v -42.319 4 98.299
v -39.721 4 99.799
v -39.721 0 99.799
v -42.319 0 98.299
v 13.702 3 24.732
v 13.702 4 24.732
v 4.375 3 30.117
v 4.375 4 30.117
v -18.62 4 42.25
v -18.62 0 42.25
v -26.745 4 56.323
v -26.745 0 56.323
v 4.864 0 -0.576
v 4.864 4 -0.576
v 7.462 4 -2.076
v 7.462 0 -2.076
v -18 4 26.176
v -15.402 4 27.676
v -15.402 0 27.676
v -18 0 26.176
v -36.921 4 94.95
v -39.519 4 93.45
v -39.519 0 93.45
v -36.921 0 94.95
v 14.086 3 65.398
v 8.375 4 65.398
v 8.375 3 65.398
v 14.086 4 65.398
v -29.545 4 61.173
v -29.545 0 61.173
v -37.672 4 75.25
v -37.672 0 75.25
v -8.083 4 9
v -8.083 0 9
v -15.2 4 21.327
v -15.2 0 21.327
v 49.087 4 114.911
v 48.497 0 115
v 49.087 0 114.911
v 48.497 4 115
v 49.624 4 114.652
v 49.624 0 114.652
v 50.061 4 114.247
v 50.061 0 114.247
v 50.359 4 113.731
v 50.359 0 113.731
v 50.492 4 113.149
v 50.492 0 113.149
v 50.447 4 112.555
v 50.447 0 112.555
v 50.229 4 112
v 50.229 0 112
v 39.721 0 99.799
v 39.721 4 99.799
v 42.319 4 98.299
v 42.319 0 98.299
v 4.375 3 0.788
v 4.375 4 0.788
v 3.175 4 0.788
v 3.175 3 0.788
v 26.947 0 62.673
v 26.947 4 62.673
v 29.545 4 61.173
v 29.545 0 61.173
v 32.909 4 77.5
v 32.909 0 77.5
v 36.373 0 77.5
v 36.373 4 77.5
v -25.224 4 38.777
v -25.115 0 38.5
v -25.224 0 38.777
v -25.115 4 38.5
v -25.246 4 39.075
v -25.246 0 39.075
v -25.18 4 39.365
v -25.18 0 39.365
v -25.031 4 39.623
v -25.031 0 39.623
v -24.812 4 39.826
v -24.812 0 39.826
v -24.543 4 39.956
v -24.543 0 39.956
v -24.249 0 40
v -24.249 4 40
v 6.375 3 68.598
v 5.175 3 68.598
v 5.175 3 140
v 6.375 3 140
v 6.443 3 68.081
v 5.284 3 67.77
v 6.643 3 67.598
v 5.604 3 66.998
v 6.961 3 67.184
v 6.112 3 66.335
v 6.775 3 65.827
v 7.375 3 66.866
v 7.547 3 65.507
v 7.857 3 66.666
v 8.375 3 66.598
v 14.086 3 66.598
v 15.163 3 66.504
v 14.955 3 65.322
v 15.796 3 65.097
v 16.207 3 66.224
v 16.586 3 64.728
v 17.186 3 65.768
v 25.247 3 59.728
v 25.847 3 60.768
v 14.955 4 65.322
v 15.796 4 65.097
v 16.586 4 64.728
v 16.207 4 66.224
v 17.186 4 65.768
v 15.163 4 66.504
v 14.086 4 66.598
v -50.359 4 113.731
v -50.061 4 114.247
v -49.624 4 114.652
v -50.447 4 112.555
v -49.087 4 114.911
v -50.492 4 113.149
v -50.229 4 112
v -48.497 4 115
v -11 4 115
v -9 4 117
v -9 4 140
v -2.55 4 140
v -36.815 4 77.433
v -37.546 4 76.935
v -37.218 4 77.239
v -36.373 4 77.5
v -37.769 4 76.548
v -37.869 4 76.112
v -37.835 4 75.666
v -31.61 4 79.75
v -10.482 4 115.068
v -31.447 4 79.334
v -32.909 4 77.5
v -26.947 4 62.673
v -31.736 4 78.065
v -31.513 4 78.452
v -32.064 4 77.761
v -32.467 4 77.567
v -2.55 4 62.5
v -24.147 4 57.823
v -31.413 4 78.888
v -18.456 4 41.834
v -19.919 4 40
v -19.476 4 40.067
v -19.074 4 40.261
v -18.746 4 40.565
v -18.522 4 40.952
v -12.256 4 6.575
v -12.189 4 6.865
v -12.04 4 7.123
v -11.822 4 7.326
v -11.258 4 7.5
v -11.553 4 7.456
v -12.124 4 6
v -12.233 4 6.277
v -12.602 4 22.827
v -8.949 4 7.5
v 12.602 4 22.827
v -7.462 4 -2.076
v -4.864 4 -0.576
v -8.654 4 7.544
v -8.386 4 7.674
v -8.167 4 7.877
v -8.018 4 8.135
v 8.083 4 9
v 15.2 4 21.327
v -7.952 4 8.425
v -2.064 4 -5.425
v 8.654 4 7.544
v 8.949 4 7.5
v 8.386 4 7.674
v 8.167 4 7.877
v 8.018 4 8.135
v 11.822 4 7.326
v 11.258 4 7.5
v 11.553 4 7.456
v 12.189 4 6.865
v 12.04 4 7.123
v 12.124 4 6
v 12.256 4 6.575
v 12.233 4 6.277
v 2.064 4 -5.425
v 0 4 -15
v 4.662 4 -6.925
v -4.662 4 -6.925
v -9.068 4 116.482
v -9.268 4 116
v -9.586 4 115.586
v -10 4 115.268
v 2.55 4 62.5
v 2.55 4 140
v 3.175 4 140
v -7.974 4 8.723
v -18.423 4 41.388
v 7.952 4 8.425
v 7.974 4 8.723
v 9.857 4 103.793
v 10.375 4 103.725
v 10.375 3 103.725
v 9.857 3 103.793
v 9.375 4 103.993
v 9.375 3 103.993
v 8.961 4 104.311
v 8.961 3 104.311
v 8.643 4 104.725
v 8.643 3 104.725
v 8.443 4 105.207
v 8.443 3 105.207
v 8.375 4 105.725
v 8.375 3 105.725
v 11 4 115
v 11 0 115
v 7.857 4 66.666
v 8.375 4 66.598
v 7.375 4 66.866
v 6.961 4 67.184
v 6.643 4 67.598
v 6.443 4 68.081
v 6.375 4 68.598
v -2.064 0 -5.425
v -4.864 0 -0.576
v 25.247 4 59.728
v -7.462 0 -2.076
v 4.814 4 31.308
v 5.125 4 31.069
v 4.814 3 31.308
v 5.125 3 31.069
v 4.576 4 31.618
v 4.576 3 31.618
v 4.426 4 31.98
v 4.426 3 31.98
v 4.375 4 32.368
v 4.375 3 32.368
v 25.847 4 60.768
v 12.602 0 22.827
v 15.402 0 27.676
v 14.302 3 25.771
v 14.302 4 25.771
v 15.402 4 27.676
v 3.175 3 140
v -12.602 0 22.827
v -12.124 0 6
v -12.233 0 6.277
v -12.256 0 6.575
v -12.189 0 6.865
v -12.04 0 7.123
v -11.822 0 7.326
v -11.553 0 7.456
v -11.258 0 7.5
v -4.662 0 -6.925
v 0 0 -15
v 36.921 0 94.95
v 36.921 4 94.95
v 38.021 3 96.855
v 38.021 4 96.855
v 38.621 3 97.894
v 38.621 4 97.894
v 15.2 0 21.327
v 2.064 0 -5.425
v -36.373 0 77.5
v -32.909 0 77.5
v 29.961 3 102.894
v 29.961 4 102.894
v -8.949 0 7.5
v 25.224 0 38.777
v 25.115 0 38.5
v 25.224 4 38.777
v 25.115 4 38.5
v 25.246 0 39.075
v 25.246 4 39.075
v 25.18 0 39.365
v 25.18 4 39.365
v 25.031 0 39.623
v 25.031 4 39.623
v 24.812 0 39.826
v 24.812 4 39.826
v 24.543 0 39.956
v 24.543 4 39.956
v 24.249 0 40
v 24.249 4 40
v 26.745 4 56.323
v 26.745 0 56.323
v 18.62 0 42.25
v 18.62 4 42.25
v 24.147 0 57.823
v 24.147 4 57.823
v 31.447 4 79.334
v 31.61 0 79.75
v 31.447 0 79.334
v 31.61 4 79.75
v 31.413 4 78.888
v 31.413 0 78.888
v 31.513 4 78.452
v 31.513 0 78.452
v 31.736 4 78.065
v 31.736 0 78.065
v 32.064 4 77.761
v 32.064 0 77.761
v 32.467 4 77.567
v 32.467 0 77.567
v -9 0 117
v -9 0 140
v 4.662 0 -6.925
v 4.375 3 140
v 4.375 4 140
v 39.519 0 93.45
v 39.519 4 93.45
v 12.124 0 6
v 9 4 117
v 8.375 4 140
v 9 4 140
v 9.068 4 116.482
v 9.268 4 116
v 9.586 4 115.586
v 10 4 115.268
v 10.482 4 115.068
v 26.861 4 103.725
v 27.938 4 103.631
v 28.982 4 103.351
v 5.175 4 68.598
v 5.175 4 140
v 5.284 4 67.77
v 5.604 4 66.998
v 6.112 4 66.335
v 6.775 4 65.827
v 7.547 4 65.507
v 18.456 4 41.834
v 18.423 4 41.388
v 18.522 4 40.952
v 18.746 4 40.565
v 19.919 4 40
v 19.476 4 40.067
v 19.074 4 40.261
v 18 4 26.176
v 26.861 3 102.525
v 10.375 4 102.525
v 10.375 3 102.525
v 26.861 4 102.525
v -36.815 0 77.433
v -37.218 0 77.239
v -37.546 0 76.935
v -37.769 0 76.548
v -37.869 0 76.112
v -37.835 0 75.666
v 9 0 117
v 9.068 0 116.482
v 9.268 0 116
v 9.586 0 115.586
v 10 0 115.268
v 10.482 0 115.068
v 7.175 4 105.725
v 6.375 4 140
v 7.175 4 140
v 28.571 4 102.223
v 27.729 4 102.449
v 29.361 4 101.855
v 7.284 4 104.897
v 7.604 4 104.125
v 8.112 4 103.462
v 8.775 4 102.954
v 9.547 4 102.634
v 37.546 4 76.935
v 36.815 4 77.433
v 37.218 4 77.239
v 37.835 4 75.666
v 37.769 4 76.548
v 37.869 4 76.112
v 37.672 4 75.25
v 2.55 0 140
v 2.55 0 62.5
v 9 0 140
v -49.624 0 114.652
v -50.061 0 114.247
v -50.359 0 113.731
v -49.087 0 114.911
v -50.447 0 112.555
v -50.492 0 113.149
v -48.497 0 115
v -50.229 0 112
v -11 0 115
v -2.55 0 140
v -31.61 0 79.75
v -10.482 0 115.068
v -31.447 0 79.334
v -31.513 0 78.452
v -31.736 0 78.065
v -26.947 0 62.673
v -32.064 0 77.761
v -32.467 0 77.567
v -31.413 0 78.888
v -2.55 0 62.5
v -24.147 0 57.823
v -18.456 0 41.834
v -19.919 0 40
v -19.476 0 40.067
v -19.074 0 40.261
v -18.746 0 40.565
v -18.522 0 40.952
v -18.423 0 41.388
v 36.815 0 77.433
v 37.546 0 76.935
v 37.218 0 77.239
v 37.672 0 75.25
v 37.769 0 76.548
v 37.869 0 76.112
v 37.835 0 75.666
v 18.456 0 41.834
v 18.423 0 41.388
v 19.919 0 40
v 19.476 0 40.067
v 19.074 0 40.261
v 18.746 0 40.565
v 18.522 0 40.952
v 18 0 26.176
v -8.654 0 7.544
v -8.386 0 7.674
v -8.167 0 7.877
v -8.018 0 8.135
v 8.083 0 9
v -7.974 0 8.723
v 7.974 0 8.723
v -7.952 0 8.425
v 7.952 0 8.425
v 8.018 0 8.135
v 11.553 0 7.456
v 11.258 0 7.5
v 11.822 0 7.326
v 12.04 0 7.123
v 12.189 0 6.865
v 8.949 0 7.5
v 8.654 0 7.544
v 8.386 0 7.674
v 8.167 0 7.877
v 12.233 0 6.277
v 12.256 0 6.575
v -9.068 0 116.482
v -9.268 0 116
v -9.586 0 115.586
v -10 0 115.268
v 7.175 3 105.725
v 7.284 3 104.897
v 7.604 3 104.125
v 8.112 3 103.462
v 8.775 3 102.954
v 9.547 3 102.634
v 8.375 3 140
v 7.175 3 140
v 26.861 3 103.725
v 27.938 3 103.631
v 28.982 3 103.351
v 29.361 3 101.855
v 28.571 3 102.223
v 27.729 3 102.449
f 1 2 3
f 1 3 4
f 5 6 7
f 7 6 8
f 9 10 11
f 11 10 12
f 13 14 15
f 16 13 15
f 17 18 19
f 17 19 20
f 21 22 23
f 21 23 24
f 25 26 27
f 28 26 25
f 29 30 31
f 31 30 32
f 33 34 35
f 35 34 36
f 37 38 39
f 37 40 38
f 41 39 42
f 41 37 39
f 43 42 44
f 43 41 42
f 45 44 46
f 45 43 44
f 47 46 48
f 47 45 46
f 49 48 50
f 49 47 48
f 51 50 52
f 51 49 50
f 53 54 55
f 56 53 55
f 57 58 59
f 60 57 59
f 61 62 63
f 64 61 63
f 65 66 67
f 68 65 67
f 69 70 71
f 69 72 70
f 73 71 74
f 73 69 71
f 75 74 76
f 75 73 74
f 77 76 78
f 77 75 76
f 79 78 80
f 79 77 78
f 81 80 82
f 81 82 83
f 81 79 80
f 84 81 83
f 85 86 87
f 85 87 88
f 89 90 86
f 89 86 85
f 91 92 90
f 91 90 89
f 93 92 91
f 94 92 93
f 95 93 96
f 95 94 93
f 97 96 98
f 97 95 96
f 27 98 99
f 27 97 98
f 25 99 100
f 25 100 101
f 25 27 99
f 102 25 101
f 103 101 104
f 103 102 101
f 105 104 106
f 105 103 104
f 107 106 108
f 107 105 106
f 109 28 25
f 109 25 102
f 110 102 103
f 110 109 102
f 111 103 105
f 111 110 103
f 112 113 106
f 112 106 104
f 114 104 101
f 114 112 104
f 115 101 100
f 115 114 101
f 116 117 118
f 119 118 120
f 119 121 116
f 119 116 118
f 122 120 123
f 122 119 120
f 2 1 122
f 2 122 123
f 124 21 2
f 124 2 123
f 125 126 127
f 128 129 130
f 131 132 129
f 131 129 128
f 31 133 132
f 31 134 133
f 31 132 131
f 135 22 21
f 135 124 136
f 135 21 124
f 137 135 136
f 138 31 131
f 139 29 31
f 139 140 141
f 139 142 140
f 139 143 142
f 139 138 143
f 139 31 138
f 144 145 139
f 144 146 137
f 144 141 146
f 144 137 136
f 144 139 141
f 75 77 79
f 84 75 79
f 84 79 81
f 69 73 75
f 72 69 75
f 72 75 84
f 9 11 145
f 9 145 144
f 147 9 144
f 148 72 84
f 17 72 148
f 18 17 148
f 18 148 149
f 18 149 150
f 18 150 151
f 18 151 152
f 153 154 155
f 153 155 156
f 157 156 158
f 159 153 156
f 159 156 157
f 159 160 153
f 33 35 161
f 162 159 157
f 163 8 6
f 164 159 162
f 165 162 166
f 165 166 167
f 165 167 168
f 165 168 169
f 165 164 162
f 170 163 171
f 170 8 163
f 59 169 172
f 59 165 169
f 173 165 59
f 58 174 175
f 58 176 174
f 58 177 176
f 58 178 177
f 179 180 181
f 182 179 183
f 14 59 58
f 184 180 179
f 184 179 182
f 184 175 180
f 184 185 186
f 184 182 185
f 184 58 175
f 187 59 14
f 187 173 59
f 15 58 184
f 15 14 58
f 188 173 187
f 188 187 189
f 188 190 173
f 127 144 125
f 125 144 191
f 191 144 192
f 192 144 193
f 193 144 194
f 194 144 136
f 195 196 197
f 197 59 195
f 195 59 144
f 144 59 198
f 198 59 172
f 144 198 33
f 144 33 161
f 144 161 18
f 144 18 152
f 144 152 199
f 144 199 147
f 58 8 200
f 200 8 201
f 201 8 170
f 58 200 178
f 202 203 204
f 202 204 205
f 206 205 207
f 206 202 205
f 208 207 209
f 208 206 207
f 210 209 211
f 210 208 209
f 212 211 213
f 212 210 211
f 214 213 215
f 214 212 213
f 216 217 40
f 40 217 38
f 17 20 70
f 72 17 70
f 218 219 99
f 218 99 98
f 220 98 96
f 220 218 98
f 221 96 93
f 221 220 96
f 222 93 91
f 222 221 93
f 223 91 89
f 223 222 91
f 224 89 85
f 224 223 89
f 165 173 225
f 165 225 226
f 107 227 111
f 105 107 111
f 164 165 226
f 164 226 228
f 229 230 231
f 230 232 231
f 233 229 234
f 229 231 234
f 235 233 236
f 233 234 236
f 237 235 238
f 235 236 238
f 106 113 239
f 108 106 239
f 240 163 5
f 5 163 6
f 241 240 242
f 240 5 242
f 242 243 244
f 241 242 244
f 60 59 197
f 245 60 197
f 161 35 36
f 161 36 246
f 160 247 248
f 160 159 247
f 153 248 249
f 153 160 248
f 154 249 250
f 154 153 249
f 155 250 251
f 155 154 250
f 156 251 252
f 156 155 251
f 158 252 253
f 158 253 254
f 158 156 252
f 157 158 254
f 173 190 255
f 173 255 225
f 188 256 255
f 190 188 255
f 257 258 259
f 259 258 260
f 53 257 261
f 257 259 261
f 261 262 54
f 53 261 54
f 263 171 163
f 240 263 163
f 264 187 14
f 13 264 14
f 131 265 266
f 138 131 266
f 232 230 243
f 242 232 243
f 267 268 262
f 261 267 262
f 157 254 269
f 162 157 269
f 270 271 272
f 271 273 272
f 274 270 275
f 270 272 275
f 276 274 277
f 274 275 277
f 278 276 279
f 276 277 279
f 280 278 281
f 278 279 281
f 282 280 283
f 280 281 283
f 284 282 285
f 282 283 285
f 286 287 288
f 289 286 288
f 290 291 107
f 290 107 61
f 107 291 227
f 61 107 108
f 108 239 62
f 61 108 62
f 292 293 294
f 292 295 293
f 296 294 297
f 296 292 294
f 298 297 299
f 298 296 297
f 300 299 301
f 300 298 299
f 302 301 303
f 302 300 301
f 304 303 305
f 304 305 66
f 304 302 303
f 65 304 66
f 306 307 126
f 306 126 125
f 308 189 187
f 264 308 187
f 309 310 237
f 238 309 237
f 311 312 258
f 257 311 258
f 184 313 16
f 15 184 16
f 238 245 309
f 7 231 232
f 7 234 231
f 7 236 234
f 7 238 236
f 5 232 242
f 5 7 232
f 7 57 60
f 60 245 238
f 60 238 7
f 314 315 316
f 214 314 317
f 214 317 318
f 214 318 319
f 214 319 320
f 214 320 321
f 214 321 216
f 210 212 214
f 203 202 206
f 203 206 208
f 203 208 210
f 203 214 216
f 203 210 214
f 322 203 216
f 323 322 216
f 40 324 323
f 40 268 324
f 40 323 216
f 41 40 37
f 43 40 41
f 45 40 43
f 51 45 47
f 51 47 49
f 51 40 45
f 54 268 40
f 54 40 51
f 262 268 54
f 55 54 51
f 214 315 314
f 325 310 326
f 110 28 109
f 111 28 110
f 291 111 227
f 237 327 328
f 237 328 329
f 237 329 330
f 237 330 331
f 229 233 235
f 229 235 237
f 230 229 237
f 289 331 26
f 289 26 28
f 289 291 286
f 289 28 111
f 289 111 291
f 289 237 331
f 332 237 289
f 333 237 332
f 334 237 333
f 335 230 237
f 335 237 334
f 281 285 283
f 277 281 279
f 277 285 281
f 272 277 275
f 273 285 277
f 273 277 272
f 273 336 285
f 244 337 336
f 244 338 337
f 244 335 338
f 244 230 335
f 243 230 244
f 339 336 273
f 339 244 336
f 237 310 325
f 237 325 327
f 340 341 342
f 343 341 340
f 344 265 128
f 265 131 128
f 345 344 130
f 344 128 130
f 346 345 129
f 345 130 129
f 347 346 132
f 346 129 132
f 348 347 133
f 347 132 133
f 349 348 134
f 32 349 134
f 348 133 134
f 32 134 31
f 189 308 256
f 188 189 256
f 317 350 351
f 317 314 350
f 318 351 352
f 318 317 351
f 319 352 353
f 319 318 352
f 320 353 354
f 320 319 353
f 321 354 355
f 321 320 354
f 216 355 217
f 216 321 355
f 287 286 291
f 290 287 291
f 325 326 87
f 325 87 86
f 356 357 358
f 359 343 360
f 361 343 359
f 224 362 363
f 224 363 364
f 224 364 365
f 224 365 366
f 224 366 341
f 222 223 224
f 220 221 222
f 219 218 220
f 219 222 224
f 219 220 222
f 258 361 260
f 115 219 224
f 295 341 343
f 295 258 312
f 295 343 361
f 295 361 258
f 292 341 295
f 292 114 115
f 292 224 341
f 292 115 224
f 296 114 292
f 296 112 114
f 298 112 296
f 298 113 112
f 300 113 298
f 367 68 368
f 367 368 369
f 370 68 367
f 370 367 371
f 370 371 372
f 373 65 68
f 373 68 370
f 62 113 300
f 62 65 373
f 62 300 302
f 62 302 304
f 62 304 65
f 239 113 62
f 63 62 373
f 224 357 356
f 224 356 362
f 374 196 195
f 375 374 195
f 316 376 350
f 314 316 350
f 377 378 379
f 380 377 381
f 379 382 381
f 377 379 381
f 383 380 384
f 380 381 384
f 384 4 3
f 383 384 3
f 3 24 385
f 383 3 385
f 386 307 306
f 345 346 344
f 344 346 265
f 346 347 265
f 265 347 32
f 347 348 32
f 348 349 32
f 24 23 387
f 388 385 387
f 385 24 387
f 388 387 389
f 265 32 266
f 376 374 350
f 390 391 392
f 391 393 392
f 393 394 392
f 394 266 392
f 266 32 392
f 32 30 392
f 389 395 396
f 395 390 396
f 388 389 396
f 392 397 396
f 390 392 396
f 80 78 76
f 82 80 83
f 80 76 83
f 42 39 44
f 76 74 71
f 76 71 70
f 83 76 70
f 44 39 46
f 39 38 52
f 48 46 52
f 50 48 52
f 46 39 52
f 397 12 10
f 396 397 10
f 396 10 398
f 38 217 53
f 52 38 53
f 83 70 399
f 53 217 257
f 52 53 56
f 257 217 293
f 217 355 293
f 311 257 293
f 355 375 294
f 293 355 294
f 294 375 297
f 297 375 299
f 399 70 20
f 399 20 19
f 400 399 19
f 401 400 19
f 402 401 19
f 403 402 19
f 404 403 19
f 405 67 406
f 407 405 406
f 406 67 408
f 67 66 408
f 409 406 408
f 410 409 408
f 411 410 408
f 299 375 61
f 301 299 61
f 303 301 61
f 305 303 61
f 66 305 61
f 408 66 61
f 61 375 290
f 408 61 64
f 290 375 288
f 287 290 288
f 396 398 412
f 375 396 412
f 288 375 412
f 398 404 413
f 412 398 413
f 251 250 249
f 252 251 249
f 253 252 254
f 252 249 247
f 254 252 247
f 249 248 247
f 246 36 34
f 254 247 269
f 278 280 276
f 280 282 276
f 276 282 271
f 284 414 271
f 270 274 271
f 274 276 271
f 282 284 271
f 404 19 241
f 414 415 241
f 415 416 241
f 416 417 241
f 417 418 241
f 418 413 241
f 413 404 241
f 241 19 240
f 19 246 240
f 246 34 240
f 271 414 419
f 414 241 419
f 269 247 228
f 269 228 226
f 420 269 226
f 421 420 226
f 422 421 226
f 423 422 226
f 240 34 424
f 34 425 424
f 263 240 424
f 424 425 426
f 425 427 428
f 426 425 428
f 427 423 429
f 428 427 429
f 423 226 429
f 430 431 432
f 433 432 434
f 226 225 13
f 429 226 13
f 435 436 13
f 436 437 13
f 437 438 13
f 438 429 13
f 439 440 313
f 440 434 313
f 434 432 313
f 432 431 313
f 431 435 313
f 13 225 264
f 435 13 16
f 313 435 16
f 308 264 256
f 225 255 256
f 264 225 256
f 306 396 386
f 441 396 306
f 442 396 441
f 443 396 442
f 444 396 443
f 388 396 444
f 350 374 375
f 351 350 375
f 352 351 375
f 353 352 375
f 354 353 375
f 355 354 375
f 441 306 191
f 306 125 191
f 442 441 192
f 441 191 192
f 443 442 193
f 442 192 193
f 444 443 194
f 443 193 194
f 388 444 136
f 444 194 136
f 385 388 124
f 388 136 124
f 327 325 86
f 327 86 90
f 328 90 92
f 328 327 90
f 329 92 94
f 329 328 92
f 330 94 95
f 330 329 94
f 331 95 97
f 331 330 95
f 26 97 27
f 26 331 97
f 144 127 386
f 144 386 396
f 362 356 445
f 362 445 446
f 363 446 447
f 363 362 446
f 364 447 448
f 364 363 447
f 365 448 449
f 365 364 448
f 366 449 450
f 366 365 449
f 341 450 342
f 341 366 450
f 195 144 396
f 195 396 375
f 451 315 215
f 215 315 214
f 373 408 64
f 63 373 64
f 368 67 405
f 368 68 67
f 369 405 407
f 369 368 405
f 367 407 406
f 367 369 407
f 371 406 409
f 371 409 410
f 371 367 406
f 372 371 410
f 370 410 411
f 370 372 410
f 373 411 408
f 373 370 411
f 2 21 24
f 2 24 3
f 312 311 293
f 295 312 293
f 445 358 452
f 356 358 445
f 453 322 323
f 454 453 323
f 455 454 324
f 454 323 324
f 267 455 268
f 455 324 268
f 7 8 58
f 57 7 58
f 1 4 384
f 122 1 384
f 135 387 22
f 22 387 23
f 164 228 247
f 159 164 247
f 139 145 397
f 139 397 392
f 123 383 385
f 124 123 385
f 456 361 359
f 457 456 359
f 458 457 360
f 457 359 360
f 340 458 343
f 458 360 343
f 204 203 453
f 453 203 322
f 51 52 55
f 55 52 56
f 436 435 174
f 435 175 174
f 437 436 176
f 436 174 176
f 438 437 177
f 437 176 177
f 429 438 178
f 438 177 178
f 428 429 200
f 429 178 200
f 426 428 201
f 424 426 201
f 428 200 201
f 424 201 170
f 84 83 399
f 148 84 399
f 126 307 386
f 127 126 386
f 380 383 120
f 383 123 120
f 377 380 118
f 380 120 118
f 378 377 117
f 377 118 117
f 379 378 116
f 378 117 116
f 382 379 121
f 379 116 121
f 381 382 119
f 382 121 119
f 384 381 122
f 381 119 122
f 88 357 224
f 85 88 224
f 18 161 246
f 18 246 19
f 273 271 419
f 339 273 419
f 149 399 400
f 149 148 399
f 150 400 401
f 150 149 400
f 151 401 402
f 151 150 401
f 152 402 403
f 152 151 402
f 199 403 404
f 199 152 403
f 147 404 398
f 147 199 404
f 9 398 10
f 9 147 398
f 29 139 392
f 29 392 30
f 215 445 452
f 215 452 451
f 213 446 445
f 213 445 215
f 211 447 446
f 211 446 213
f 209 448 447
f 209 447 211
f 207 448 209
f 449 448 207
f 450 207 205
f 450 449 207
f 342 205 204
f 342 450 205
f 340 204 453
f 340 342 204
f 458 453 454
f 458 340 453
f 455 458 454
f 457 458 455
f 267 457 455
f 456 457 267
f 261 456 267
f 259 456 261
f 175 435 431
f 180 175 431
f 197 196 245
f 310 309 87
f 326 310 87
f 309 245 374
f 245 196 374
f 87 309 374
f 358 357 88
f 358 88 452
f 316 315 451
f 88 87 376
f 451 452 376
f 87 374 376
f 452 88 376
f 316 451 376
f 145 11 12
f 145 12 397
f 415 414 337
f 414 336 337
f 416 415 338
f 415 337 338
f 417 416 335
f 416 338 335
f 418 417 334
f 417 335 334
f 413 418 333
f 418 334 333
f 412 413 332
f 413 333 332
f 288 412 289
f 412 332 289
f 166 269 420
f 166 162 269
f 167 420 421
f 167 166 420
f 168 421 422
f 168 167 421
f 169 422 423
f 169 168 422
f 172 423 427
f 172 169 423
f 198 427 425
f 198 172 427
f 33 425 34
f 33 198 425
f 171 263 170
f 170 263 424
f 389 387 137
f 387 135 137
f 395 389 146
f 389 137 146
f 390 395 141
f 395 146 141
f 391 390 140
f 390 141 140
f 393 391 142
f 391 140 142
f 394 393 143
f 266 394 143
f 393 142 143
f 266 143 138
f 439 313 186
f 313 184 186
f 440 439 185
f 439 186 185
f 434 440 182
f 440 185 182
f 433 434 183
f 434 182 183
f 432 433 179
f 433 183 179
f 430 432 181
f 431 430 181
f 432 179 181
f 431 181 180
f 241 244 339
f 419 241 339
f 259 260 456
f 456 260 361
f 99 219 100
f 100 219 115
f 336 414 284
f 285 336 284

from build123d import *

# Parameters (mm, degrees)
ESBO_O1_W             = 18
ESBO_O1_H             = 25
RVORE_DEPTH           = 4
ESBO_O2_W             = 5.1
ESBO_O2_H             = 77.5
ENCAIXE_DEPTH         = 5
FILETE2_R             = 1
FILETE3_R             = 1
FILETE4_R             = 1
FILETE5_R             = 1
FILETE6_R             = 1
FILETE7_R             = 1
FILETE8_R             = 1.5
FILETE9_R             = 1.5
FILETE10_R            = 1.5
FILETE11_R            = 1.5
FILETE12_R            = 2
FILETE13_R            = 2
FILETE14_R            = 2
FILETE15_R            = 2
FILETE16_R            = 1.5
FILETE17_R            = 1.5
CORTES_DO_LED_DEPTH   = 10
ESBO_O6_W             = 16.486143217
ESBO_O6_H             = 1.199999983
ESBO_O6_W_2           = 1.200000015
ESBO_O6_H_2           = 34.2751352
ESBO_O6_W_3           = 5.711274815
ESBO_O6_H_3           = 1.2
ESBO_O6_W_4           = 1.2
ESBO_O6_H_4           = 71.40185633
CORTE_EXTRUS_O4_DEPTH = 1
FILETE18_R            = 1.5


with BuildPart() as part:
    # Esboço1 → rvore (new body)
    with BuildSketch(Plane(origin=(0, 0, 0), x_dir=(1, 0, 0), z_dir=(0, 1, 0))):
        with Locations((0, -127.5)):
            Rectangle(ESBO_O1_W, ESBO_O1_H)
        Polygon((-51.961524227, -115), (-9, -115), (9, -115), (51.961524227, -115), (30.310889132, -77.5), (-30.310889132, -77.5), align=None)
        Polygon((-8.660254038, -40), (-30.310889132, -77.5), (30.310889132, -77.5), (8.660254038, -40), align=None)
        Polygon((-17.320508076, -40), (-8.660254038, -40), (0, -25), (8.660254038, -40), (17.320508076, -40), (0, -10), align=None)
        Polygon((8.660254038, -40), (30.310889132, -77.5), (38.97114317, -77.5), (17.320508076, -40), align=None)
        Polygon((0, -25), (-8.660254038, -40), (8.660254038, -40), align=None)
        Polygon((-38.97114317, -77.5), (-30.310889132, -77.5), (-8.660254038, -40), (-17.320508076, -40), align=None)
        Polygon((-25.980762114, -40), (-17.320508076, -40), (0, -10), (17.320508076, -40), (25.980762114, -40), (7.216878365, -7.5), (-7.216878365, -7.5), align=None)
        Polygon((0, 5), (-7.216878365, -7.5), (7.216878365, -7.5), align=None)
        Polygon((-12.990381057, -7.5), (-7.216878365, -7.5), (0, 5), (7.216878365, -7.5), (12.990381057, -7.5), (0, 15), align=None)
    extrude(amount=RVORE_DEPTH)

    # Esboço2 → Encaixe (cut)
    with BuildSketch(Plane(origin=(0, 4, 0), x_dir=(1, 0, 0), z_dir=(0, 1, 0))):
        with Locations((0, -101.25)):
            Rectangle(ESBO_O2_W, ESBO_O2_H)
    extrude(amount=-ENCAIXE_DEPTH, mode=Mode.SUBTRACT)

    # Filete2
    filete2_edges = [part.edges().sort_by_distance(p)[0] for p in [
        (12.990381057, 2, 7.5),
    ]]
    fillet(filete2_edges, radius=FILETE2_R)

    # Filete3
    filete3_edges = [part.edges().sort_by_distance(p)[0] for p in [
        (-12.990381057, 2, 7.5),
    ]]
    fillet(filete3_edges, radius=FILETE3_R)

    # Filete4
    filete4_edges = [part.edges().sort_by_distance(p)[0] for p in [
        (-7.216878365, 2, 7.5),
    ]]
    fillet(filete4_edges, radius=FILETE4_R)

    # Filete5
    filete5_edges = [part.edges().sort_by_distance(p)[0] for p in [
        (7.216878365, 2, 7.5),
    ]]
    fillet(filete5_edges, radius=FILETE5_R)

    # Filete6
    filete6_edges = [part.edges().sort_by_distance(p)[0] for p in [
        (25.980762114, 2, 40),
    ]]
    fillet(filete6_edges, radius=FILETE6_R)

    # Filete7
    filete7_edges = [part.edges().sort_by_distance(p)[0] for p in [
        (-25.980762114, 2, 40),
    ]]
    fillet(filete7_edges, radius=FILETE7_R)

    # Filete8
    filete8_edges = [part.edges().sort_by_distance(p)[0] for p in [
        (17.320508076, 2, 40),
    ]]
    fillet(filete8_edges, radius=FILETE8_R)

    # Filete9
    filete9_edges = [part.edges().sort_by_distance(p)[0] for p in [
        (-17.320508076, 2, 40),
    ]]
    fillet(filete9_edges, radius=FILETE9_R)

    # Filete10
    filete10_edges = [part.edges().sort_by_distance(p)[0] for p in [
        (38.97114317, 2, 77.5),
    ]]
    fillet(filete10_edges, radius=FILETE10_R)

    # Filete11
    filete11_edges = [part.edges().sort_by_distance(p)[0] for p in [
        (-38.97114317, 2, 77.5),
    ]]
    fillet(filete11_edges, radius=FILETE11_R)

    # Filete12
    filete12_edges = [part.edges().sort_by_distance(p)[0] for p in [
        (51.961524227, 2, 115),
    ]]
    fillet(filete12_edges, radius=FILETE12_R)

    # Filete13
    filete13_edges = [part.edges().sort_by_distance(p)[0] for p in [
        (-51.961524227, 2, 115),
    ]]
    fillet(filete13_edges, radius=FILETE13_R)

    # Filete14
    filete14_edges = [part.edges().sort_by_distance(p)[0] for p in [
        (9, 2, 115),
    ]]
    fillet(filete14_edges, radius=FILETE14_R)

    # Filete15
    filete15_edges = [part.edges().sort_by_distance(p)[0] for p in [
        (-9, 2, 115),
    ]]
    fillet(filete15_edges, radius=FILETE15_R)

    # Filete16
    filete16_edges = [part.edges().sort_by_distance(p)[0] for p in [
        (30.310889132, 2, 77.5),
    ]]
    fillet(filete16_edges, radius=FILETE16_R)

    # Filete17
    filete17_edges = [part.edges().sort_by_distance(p)[0] for p in [
        (-30.310889132, 2, 77.5),
    ]]
    fillet(filete17_edges, radius=FILETE17_R)

    # Esboço5 → Cortes do Led (cut)
    with BuildSketch(Plane(origin=(0, 4, 0), x_dir=(1, 0, 0), z_dir=(0, 1, 0))):
        Polygon((42.319473419, -98.299478112), (39.519473419, -93.449735851), (36.921397208, -94.949735851), (39.721397208, -99.799478112), align=None)
        Polygon((29.544605065, -61.172757061), (26.744605065, -56.3230148), (24.146528853, -57.8230148), (26.946528853, -62.672757061), align=None)
        Polygon((17.99973671, -26.176458504), (15.19973671, -21.326716243), (12.601660498, -22.826716243), (15.401660498, -27.676458504), align=None)
        Polygon((7.461855653, 2.07568689), (4.661855653, 6.925429151), (2.063779442, 5.425429151), (4.863779442, 0.57568689), align=None)
        Polygon((-7.461855653, 2.07568689), (-4.661855653, 6.925429151), (-2.063779442, 5.425429151), (-4.863779442, 0.57568689), align=None)
        Polygon((-17.99973671, -26.176458504), (-15.19973671, -21.326716243), (-12.601660498, -22.826716243), (-15.401660498, -27.676458504), align=None)
        Polygon((-29.544605065, -61.172757061), (-26.744605065, -56.3230148), (-24.146528853, -57.8230148), (-26.946528853, -62.672757061), align=None)
        Polygon((-42.319473419, -98.299478112), (-39.519473419, -93.449735851), (-36.921397208, -94.949735851), (-39.721397208, -99.799478112), align=None)
    extrude(amount=-CORTES_DO_LED_DEPTH, mode=Mode.SUBTRACT)

    # Esboço6 → Corte-extrusão4 (cut)
    with BuildSketch(Plane(origin=(0, 4, 0), x_dir=(1, 0, 0), z_dir=(0, 1, 0))):
        with BuildLine():
            Line((26.861143157, -102.524864809), (26.861143157, -103.724864792))
            ThreePointArc((26.861143157, -103.724864792), (28.465821261, -103.513604912), (29.96114317, -102.894222224))
            Line((29.96114317, -102.894222224), (29.36114317, -101.854991739))
            ThreePointArc((29.36114317, -101.854991739), (28.155238411, -102.354493936), (26.861143157, -102.524864809))
        make_face()
        with Locations((18.618071549, -103.124864801)):
            Rectangle(ESBO_O6_W, ESBO_O6_H)
        Polygon((38.021397208, -96.854991739), (29.36114317, -101.854991739), (29.96114317, -102.894222224), (38.621397208, -97.894222224), align=None)
        with BuildLine():
            ThreePointArc((10.37499994, -103.724864792), (8.960786372, -104.310651232), (8.375000015, -105.7248648))
            Line((8.375000015, -105.7248648), (7.175, -105.7248648))
            ThreePointArc((7.175, -105.7248648), (8.112258246, -103.462123106), (10.37499994, -102.524864809))
            Line((10.37499994, -102.524864809), (10.37499994, -103.724864792))
        make_face()
        with Locations((7.775000008, -122.8624324)):
            Rectangle(ESBO_O6_W_2, ESBO_O6_H_2)
        Polygon((25.246528853, -59.728270689), (16.586274815, -64.728270689), (17.186274815, -65.767501173), (25.846528853, -60.767501173), align=None)
        with BuildLine():
            Line((14.086274815, -66.59814367), (14.086274815, -65.39814367))
            ThreePointArc((14.086274815, -65.39814367), (15.380370041, -65.227772801), (16.586274815, -64.728270689))
            Line((16.586274815, -64.728270689), (17.186274815, -65.767501173))
            ThreePointArc((17.186274815, -65.767501173), (15.690952895, -66.386883793), (14.086274815, -66.59814367))
        make_face()
        with Locations((11.230637408, -65.99814367)):
            Rectangle(ESBO_O6_W_3, ESBO_O6_H_3)
        with BuildLine():
            ThreePointArc((8.375, -66.59814367), (6.960786438, -67.183930107), (6.375, -68.59814367))
            Line((6.375, -68.59814367), (5.175, -68.59814367))
            ThreePointArc((5.175, -68.59814367), (6.1122583, -66.33540197), (8.375, -65.39814367))
            Line((8.375, -65.39814367), (8.375, -66.59814367))
        make_face()
        with Locations((5.775, -104.299071835)):
            Rectangle(ESBO_O6_W_4, ESBO_O6_H_4)
        Polygon((4.375, -30.116722081), (4.375, -31.502362727), (14.301660498, -25.771202616), (13.701660498, -24.731972131), align=None)
        Polygon((3.175, -0.788496095), (3.175, -140), (4.375, -140), (4.375, -31.502362727), (3.909355653, -31.771202616), (3.309355653, -30.731972131), (4.375, -30.116722081), (4.375, -0.788496095), align=None)
        Polygon((3.909355653, -31.771202616), (4.375, -31.502362727), (4.375, -30.116722081), (3.309355653, -30.731972131), align=None)
    extrude(amount=-CORTE_EXTRUS_O4_DEPTH, mode=Mode.SUBTRACT)

    # Filete18
    filete18_edges = [part.edges().sort_by_distance(p)[0] for p in [
        (4.375, 3.5, 31.502362727),
    ]]
    fillet(filete18_edges, radius=FILETE18_R)


solid = part.part
